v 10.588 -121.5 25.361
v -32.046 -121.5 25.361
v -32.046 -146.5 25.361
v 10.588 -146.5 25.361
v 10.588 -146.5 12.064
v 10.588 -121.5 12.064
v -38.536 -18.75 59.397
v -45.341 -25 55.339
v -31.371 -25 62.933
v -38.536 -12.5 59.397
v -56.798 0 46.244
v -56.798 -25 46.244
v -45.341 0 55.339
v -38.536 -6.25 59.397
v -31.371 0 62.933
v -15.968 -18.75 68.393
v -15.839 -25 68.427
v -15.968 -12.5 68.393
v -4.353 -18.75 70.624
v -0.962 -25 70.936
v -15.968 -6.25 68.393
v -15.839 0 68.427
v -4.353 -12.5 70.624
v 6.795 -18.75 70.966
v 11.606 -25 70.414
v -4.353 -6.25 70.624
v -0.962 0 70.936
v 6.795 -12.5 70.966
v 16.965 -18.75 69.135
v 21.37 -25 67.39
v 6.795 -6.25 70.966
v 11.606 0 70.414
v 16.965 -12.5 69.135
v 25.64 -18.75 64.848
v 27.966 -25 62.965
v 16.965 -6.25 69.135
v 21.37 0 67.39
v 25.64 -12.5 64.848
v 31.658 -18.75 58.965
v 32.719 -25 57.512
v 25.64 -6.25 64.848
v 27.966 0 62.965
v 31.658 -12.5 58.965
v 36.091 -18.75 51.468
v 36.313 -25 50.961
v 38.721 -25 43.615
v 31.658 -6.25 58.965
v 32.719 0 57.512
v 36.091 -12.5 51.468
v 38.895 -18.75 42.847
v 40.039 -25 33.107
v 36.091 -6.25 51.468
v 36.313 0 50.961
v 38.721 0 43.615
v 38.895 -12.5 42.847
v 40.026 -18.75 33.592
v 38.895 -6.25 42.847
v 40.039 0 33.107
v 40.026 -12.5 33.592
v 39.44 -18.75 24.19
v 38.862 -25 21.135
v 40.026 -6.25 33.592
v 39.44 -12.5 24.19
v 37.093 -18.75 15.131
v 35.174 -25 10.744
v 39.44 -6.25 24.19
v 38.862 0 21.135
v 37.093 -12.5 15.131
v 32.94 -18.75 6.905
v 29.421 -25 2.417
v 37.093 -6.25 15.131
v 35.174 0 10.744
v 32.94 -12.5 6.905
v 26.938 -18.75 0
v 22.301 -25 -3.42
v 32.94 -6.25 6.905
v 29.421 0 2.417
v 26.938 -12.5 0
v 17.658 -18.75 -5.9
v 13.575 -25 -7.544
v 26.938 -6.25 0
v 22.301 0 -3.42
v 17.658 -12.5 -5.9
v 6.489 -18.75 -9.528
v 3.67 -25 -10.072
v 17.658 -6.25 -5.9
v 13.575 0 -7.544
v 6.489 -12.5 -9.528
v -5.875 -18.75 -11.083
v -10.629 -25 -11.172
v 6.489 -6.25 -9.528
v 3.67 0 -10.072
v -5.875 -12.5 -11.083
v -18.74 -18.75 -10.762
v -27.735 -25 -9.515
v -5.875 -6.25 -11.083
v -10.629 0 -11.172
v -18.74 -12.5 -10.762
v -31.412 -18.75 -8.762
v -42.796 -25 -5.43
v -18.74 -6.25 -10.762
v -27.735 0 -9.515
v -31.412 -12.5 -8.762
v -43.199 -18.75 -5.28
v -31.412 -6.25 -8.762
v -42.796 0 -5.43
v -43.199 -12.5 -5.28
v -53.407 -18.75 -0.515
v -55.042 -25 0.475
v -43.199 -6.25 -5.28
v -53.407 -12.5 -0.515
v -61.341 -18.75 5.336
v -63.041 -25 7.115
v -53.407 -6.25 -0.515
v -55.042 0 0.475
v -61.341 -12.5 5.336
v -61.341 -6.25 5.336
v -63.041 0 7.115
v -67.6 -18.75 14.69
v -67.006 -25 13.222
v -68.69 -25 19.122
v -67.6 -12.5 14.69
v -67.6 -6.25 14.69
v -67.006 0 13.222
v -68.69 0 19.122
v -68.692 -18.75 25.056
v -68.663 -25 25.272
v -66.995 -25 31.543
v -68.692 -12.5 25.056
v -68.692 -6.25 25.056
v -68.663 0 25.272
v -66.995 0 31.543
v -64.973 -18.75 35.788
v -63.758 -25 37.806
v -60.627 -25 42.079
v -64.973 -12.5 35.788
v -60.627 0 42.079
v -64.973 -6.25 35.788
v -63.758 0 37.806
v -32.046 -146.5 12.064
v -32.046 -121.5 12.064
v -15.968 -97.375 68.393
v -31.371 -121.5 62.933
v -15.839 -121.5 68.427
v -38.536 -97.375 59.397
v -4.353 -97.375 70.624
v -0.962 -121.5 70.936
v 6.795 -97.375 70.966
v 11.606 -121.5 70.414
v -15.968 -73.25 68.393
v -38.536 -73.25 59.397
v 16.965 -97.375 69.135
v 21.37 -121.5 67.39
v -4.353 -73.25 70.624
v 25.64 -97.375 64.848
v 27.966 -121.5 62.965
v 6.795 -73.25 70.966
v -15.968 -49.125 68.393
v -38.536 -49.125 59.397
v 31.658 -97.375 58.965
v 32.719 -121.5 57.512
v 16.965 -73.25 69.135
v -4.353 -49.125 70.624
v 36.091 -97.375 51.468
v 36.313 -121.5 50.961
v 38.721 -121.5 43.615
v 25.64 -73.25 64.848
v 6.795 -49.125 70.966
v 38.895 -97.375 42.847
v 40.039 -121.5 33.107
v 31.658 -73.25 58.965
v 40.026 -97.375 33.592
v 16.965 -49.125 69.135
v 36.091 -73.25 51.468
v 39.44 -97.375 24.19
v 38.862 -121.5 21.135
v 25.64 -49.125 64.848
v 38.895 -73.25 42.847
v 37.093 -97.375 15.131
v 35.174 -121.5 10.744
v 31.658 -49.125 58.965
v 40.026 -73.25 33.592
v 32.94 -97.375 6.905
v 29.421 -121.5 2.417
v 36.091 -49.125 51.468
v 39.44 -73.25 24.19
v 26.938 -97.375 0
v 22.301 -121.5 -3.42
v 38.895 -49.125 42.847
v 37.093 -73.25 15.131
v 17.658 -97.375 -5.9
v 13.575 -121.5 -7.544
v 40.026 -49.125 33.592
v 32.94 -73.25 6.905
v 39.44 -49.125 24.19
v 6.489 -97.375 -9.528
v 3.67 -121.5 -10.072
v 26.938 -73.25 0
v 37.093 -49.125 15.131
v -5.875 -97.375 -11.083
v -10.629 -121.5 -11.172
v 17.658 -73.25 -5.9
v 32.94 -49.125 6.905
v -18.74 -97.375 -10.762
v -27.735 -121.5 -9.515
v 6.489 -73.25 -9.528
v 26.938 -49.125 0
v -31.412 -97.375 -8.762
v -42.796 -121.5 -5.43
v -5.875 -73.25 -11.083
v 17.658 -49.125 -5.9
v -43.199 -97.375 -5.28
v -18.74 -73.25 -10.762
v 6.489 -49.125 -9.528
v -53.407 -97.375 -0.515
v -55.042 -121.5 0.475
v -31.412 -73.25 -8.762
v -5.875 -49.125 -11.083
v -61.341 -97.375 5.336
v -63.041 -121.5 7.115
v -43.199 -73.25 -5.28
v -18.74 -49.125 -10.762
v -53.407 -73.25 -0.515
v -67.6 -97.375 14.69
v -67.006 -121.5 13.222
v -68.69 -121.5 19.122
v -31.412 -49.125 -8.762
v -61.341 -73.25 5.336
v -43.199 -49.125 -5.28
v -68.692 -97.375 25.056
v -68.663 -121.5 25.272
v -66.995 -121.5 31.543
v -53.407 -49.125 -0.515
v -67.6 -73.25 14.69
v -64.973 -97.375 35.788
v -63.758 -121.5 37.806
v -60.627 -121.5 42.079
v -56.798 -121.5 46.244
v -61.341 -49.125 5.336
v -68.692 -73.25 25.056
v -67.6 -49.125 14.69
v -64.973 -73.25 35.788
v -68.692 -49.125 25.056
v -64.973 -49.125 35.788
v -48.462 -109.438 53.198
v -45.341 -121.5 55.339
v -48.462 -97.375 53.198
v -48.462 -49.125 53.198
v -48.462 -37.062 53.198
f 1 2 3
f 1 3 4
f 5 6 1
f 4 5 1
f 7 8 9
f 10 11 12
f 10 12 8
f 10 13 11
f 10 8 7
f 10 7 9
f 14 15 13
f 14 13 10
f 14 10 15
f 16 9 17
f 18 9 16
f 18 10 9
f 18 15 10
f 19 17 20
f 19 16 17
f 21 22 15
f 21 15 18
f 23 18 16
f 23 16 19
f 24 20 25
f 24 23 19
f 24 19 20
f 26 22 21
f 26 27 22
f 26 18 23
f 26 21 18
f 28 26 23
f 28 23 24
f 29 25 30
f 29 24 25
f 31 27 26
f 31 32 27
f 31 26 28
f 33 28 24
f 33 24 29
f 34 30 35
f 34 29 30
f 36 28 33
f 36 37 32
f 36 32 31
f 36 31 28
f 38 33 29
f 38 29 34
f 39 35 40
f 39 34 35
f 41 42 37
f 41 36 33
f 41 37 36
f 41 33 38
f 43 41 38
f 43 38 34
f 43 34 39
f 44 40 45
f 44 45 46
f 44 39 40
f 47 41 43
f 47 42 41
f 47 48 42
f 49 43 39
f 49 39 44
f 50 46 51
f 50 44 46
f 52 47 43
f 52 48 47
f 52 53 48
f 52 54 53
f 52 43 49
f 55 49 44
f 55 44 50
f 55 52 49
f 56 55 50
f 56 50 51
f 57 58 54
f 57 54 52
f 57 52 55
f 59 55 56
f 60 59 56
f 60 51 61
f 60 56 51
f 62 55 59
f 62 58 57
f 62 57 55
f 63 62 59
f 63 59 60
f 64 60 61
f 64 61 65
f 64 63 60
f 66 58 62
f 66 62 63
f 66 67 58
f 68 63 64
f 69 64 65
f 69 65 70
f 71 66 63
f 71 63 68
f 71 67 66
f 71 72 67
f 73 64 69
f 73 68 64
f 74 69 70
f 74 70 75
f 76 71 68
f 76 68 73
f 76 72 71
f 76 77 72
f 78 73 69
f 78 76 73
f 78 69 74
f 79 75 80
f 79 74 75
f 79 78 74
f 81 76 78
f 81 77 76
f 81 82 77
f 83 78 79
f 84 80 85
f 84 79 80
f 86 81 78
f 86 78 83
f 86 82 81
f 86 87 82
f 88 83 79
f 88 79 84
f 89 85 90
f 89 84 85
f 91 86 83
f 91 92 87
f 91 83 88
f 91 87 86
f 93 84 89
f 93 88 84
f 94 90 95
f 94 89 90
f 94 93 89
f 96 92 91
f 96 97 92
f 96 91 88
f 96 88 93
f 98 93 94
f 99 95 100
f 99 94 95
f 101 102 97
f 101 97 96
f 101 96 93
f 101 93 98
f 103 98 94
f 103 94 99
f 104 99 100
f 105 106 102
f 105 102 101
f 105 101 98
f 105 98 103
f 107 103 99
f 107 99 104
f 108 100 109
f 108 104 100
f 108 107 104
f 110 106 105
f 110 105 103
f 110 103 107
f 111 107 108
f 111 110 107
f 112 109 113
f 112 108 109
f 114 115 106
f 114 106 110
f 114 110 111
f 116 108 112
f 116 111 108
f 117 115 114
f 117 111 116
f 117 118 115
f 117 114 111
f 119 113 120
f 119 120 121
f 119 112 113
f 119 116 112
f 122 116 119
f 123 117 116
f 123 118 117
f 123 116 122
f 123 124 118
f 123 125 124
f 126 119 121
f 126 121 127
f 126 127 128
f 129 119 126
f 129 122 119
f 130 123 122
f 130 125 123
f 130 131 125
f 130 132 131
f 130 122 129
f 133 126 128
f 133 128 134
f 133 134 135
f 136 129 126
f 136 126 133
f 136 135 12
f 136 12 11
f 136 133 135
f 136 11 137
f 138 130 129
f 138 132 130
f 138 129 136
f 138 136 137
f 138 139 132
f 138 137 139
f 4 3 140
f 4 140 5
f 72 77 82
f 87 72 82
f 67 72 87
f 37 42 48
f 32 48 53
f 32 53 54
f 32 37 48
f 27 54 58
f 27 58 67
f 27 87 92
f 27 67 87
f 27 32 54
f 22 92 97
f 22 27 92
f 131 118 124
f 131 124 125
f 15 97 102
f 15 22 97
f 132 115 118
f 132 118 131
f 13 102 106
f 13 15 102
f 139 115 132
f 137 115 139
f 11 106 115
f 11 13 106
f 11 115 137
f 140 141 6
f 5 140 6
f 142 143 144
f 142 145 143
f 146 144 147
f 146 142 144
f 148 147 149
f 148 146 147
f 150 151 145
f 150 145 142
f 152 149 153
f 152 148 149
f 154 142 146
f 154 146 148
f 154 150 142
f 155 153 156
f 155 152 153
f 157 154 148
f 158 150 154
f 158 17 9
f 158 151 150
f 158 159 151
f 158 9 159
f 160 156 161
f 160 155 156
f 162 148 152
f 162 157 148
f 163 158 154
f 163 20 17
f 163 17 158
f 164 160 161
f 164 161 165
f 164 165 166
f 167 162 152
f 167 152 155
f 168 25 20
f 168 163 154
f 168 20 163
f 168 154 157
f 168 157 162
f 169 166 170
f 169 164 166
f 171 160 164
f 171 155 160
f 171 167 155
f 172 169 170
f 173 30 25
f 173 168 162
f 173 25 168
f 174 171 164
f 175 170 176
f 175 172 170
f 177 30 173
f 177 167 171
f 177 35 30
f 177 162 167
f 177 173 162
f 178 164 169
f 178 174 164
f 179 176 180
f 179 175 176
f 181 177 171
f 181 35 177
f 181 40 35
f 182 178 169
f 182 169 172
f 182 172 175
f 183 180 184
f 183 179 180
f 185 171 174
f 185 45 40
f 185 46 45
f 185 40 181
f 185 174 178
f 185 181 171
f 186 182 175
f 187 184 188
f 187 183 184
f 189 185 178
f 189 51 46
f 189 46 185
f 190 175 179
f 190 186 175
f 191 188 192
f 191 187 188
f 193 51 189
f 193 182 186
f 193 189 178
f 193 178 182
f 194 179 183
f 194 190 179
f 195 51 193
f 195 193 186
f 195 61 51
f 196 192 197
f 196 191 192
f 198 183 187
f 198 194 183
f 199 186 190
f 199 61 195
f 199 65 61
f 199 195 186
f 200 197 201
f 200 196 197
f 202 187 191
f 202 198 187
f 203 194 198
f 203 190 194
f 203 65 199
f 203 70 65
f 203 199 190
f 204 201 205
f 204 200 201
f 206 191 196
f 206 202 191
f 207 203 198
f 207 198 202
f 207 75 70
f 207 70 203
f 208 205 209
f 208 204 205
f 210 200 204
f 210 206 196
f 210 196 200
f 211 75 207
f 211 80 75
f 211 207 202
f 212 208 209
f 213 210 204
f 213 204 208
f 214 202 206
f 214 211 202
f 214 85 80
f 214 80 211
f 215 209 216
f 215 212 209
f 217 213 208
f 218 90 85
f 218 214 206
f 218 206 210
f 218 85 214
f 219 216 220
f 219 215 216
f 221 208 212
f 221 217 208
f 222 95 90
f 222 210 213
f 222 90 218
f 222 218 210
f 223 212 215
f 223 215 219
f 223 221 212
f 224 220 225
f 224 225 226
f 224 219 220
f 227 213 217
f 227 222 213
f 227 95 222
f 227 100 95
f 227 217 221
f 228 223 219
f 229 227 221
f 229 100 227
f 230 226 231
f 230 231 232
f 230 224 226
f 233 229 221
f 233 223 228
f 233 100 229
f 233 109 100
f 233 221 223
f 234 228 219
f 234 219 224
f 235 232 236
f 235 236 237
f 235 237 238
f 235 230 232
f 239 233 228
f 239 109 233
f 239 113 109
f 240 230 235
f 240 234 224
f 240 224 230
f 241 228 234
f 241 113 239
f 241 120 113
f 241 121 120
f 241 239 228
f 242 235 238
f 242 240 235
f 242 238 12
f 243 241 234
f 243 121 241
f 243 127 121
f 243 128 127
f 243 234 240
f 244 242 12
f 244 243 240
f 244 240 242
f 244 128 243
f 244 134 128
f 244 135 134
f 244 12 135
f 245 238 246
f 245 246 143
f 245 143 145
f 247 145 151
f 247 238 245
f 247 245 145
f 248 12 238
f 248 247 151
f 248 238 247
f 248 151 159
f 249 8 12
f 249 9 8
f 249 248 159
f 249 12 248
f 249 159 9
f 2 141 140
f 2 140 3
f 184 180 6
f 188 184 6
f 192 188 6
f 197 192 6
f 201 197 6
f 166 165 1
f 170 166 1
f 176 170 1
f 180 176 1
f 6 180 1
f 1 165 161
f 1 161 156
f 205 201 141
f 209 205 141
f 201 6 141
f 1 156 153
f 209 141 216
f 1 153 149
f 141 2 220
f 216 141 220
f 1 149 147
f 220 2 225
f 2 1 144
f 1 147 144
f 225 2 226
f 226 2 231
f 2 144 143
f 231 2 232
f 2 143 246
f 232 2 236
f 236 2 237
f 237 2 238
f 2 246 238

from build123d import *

# Parameters (mm, degrees)
F1_DEPTH = 25
F2_DEPTH = 96.5
F3_W     = 42.6337057725
F3_H     = 13.297191821
F4_DEPTH = 25


with BuildPart() as f1:
    # F0 (on Front) → F1 (new body)
    with BuildSketch(Plane.XZ):
        with BuildLine():
            add(Edge.make_bspline(
                [(-56.7976459861, 46.2436228991), (-37.148106518, 65.5450378595), (41.8380193275, 92.2991007532), (47.4172482458, -25.2698744471), (-77.3604939257, -6.4949832774), (-70.510562426, 32.7736537451), (-56.7976459861, 46.2436228991)],
                knots=[0, 0, 0, 0, 0.2780151532, 0.5215745751, 0.8059802587, 1, 1, 1, 1], degree=3))
        make_face()
    extrude(amount=F1_DEPTH)

    # F2 (add): a face of the model
    f2_faces = [f1.faces().sort_by_distance(p)[0] for p in [
        (-11.5259199294, -25, 28.7639480383),
    ]]
    extrude(f2_faces, amount=F2_DEPTH)

    # F3 (on face) → F4 (join)
    with BuildSketch(Plane.XZ.offset(121.5)):
        with Locations((-10.7288467698, 18.712206278)):
            Rectangle(F3_W, F3_H)
    extrude(amount=F4_DEPTH)


solid = f1.part
